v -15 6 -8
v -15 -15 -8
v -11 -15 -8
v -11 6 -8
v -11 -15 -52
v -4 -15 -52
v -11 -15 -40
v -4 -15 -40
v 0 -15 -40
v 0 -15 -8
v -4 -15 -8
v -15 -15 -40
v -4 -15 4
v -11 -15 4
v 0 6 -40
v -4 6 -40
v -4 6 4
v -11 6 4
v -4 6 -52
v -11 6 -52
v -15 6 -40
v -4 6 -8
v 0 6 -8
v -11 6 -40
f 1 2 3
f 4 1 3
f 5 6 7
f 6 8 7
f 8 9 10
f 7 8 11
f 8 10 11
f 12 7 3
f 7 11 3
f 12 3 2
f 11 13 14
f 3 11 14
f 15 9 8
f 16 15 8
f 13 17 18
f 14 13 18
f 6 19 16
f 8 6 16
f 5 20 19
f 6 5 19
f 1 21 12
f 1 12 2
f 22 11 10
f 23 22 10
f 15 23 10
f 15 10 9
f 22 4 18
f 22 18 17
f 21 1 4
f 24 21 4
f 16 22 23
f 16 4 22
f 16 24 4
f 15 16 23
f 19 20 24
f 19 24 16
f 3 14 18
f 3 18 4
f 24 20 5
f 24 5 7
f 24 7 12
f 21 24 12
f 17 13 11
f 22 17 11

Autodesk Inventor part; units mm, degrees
ref_plane "YZ Plane" through (0, 0, 0) normal (1, 0, 0) x (0, 1, 0)
ref_plane "XZ Plane" through (0, 0, 0) normal (0, 1, 0) x (-1, 0, 0)
ref_plane "XY Plane" through (0, 0, 0) normal (0, 0, 1) x (1, 0, 0)
sketch "Sketch1" plane through (0, 0, 0) normal (0, 1, 0) x (-1, 0, 0)
  line L0 (4, 4) -> (11, 4) projected
  line L1 (11, -8) -> (4, -8) projected
  line L2 (11, -52) -> (4, -52) projected
  line L3 (4, -40) -> (11, -40) projected
  line L4 (15, -8) -> (0, -8)
  line L5 (0, -8) -> (0, -40)
  line L6 (0, -40) -> (15, -40)
  line L7 (15, -40) -> (15, -8)
  line L8 (11, 4) -> (11, -8) projected
  line L9 (4, 4) -> (4, -8) projected
  line L10 (4, -52) -> (4, -40) projected
  line L11 (11, -52) -> (11, -40) projected
  point P0 (4, 0)
  point P1 (11, 0)
  point P2 (11, -48)
  point P3 (4, -48)
  point P4 (0, -8)
  point P5 (15, -40)
extrude "Extrusion1" add sketch "Sketch1" against normal blind 15
sketch "Sketch2" plane through (0, 0, 0) normal (0, 1, 0) x (1, 0, 0)
  line L0 (-4, 8) -> (0, 8) projected
  line L1 (0, 8) -> (0, 40) projected
  line L2 (0, 40) -> (-4, 40) projected
  line L3 (-11, 40) -> (-15, 40) projected
  line L4 (-15, 40) -> (-15, 8) projected
  line L5 (-15, 8) -> (-11, 8) projected
  line L6 (-11, 52) -> (-4, 52) projected
  line L7 (-4, 40) -> (-11, 40) projected
  line L8 (-4, -4) -> (-11, -4) projected
  line L9 (-11, 8) -> (-4, 8) projected
  line L10 (-11, 52) -> (-11, 40) projected
  line L11 (-11, 8) -> (-11, -4) projected
  line L12 (-11, -4) -> (-4, -4) projected
  line L13 (-4, -4) -> (-4, 8) projected
  line L14 (-4, 40) -> (-4, 52) projected
  line L15 (-4, 52) -> (-11, 52) projected
  line L16 (-4, 52) -> (-4, 40) projected
  line L17 (-11, 52) -> (-11, 40) projected
  line L18 (-11, -4) -> (-11, 8) projected
  line L19 (-4, -4) -> (-4, 8) projected
  point P0 (-4, 0)
  point P1 (-4, 48)
  point P2 (-11, 48)
  point P3 (-11, 0)
extrude "Extrusion2" add sketch "Sketch2" along normal blind 6
sketch "Sketch3" plane through (0, 0, -52) normal (0, 0, -1) x (-1, 0, 0)
  line L0 (4, 6) -> (11, 6) projected
  line L1 (11, -15) -> (4, -15) projected
  line L2 (11, 6) -> (11, -15) projected
  line L3 (4, -15) -> (4, 6) projected
  point P0 (0, 0)
properties part number "Connector"
